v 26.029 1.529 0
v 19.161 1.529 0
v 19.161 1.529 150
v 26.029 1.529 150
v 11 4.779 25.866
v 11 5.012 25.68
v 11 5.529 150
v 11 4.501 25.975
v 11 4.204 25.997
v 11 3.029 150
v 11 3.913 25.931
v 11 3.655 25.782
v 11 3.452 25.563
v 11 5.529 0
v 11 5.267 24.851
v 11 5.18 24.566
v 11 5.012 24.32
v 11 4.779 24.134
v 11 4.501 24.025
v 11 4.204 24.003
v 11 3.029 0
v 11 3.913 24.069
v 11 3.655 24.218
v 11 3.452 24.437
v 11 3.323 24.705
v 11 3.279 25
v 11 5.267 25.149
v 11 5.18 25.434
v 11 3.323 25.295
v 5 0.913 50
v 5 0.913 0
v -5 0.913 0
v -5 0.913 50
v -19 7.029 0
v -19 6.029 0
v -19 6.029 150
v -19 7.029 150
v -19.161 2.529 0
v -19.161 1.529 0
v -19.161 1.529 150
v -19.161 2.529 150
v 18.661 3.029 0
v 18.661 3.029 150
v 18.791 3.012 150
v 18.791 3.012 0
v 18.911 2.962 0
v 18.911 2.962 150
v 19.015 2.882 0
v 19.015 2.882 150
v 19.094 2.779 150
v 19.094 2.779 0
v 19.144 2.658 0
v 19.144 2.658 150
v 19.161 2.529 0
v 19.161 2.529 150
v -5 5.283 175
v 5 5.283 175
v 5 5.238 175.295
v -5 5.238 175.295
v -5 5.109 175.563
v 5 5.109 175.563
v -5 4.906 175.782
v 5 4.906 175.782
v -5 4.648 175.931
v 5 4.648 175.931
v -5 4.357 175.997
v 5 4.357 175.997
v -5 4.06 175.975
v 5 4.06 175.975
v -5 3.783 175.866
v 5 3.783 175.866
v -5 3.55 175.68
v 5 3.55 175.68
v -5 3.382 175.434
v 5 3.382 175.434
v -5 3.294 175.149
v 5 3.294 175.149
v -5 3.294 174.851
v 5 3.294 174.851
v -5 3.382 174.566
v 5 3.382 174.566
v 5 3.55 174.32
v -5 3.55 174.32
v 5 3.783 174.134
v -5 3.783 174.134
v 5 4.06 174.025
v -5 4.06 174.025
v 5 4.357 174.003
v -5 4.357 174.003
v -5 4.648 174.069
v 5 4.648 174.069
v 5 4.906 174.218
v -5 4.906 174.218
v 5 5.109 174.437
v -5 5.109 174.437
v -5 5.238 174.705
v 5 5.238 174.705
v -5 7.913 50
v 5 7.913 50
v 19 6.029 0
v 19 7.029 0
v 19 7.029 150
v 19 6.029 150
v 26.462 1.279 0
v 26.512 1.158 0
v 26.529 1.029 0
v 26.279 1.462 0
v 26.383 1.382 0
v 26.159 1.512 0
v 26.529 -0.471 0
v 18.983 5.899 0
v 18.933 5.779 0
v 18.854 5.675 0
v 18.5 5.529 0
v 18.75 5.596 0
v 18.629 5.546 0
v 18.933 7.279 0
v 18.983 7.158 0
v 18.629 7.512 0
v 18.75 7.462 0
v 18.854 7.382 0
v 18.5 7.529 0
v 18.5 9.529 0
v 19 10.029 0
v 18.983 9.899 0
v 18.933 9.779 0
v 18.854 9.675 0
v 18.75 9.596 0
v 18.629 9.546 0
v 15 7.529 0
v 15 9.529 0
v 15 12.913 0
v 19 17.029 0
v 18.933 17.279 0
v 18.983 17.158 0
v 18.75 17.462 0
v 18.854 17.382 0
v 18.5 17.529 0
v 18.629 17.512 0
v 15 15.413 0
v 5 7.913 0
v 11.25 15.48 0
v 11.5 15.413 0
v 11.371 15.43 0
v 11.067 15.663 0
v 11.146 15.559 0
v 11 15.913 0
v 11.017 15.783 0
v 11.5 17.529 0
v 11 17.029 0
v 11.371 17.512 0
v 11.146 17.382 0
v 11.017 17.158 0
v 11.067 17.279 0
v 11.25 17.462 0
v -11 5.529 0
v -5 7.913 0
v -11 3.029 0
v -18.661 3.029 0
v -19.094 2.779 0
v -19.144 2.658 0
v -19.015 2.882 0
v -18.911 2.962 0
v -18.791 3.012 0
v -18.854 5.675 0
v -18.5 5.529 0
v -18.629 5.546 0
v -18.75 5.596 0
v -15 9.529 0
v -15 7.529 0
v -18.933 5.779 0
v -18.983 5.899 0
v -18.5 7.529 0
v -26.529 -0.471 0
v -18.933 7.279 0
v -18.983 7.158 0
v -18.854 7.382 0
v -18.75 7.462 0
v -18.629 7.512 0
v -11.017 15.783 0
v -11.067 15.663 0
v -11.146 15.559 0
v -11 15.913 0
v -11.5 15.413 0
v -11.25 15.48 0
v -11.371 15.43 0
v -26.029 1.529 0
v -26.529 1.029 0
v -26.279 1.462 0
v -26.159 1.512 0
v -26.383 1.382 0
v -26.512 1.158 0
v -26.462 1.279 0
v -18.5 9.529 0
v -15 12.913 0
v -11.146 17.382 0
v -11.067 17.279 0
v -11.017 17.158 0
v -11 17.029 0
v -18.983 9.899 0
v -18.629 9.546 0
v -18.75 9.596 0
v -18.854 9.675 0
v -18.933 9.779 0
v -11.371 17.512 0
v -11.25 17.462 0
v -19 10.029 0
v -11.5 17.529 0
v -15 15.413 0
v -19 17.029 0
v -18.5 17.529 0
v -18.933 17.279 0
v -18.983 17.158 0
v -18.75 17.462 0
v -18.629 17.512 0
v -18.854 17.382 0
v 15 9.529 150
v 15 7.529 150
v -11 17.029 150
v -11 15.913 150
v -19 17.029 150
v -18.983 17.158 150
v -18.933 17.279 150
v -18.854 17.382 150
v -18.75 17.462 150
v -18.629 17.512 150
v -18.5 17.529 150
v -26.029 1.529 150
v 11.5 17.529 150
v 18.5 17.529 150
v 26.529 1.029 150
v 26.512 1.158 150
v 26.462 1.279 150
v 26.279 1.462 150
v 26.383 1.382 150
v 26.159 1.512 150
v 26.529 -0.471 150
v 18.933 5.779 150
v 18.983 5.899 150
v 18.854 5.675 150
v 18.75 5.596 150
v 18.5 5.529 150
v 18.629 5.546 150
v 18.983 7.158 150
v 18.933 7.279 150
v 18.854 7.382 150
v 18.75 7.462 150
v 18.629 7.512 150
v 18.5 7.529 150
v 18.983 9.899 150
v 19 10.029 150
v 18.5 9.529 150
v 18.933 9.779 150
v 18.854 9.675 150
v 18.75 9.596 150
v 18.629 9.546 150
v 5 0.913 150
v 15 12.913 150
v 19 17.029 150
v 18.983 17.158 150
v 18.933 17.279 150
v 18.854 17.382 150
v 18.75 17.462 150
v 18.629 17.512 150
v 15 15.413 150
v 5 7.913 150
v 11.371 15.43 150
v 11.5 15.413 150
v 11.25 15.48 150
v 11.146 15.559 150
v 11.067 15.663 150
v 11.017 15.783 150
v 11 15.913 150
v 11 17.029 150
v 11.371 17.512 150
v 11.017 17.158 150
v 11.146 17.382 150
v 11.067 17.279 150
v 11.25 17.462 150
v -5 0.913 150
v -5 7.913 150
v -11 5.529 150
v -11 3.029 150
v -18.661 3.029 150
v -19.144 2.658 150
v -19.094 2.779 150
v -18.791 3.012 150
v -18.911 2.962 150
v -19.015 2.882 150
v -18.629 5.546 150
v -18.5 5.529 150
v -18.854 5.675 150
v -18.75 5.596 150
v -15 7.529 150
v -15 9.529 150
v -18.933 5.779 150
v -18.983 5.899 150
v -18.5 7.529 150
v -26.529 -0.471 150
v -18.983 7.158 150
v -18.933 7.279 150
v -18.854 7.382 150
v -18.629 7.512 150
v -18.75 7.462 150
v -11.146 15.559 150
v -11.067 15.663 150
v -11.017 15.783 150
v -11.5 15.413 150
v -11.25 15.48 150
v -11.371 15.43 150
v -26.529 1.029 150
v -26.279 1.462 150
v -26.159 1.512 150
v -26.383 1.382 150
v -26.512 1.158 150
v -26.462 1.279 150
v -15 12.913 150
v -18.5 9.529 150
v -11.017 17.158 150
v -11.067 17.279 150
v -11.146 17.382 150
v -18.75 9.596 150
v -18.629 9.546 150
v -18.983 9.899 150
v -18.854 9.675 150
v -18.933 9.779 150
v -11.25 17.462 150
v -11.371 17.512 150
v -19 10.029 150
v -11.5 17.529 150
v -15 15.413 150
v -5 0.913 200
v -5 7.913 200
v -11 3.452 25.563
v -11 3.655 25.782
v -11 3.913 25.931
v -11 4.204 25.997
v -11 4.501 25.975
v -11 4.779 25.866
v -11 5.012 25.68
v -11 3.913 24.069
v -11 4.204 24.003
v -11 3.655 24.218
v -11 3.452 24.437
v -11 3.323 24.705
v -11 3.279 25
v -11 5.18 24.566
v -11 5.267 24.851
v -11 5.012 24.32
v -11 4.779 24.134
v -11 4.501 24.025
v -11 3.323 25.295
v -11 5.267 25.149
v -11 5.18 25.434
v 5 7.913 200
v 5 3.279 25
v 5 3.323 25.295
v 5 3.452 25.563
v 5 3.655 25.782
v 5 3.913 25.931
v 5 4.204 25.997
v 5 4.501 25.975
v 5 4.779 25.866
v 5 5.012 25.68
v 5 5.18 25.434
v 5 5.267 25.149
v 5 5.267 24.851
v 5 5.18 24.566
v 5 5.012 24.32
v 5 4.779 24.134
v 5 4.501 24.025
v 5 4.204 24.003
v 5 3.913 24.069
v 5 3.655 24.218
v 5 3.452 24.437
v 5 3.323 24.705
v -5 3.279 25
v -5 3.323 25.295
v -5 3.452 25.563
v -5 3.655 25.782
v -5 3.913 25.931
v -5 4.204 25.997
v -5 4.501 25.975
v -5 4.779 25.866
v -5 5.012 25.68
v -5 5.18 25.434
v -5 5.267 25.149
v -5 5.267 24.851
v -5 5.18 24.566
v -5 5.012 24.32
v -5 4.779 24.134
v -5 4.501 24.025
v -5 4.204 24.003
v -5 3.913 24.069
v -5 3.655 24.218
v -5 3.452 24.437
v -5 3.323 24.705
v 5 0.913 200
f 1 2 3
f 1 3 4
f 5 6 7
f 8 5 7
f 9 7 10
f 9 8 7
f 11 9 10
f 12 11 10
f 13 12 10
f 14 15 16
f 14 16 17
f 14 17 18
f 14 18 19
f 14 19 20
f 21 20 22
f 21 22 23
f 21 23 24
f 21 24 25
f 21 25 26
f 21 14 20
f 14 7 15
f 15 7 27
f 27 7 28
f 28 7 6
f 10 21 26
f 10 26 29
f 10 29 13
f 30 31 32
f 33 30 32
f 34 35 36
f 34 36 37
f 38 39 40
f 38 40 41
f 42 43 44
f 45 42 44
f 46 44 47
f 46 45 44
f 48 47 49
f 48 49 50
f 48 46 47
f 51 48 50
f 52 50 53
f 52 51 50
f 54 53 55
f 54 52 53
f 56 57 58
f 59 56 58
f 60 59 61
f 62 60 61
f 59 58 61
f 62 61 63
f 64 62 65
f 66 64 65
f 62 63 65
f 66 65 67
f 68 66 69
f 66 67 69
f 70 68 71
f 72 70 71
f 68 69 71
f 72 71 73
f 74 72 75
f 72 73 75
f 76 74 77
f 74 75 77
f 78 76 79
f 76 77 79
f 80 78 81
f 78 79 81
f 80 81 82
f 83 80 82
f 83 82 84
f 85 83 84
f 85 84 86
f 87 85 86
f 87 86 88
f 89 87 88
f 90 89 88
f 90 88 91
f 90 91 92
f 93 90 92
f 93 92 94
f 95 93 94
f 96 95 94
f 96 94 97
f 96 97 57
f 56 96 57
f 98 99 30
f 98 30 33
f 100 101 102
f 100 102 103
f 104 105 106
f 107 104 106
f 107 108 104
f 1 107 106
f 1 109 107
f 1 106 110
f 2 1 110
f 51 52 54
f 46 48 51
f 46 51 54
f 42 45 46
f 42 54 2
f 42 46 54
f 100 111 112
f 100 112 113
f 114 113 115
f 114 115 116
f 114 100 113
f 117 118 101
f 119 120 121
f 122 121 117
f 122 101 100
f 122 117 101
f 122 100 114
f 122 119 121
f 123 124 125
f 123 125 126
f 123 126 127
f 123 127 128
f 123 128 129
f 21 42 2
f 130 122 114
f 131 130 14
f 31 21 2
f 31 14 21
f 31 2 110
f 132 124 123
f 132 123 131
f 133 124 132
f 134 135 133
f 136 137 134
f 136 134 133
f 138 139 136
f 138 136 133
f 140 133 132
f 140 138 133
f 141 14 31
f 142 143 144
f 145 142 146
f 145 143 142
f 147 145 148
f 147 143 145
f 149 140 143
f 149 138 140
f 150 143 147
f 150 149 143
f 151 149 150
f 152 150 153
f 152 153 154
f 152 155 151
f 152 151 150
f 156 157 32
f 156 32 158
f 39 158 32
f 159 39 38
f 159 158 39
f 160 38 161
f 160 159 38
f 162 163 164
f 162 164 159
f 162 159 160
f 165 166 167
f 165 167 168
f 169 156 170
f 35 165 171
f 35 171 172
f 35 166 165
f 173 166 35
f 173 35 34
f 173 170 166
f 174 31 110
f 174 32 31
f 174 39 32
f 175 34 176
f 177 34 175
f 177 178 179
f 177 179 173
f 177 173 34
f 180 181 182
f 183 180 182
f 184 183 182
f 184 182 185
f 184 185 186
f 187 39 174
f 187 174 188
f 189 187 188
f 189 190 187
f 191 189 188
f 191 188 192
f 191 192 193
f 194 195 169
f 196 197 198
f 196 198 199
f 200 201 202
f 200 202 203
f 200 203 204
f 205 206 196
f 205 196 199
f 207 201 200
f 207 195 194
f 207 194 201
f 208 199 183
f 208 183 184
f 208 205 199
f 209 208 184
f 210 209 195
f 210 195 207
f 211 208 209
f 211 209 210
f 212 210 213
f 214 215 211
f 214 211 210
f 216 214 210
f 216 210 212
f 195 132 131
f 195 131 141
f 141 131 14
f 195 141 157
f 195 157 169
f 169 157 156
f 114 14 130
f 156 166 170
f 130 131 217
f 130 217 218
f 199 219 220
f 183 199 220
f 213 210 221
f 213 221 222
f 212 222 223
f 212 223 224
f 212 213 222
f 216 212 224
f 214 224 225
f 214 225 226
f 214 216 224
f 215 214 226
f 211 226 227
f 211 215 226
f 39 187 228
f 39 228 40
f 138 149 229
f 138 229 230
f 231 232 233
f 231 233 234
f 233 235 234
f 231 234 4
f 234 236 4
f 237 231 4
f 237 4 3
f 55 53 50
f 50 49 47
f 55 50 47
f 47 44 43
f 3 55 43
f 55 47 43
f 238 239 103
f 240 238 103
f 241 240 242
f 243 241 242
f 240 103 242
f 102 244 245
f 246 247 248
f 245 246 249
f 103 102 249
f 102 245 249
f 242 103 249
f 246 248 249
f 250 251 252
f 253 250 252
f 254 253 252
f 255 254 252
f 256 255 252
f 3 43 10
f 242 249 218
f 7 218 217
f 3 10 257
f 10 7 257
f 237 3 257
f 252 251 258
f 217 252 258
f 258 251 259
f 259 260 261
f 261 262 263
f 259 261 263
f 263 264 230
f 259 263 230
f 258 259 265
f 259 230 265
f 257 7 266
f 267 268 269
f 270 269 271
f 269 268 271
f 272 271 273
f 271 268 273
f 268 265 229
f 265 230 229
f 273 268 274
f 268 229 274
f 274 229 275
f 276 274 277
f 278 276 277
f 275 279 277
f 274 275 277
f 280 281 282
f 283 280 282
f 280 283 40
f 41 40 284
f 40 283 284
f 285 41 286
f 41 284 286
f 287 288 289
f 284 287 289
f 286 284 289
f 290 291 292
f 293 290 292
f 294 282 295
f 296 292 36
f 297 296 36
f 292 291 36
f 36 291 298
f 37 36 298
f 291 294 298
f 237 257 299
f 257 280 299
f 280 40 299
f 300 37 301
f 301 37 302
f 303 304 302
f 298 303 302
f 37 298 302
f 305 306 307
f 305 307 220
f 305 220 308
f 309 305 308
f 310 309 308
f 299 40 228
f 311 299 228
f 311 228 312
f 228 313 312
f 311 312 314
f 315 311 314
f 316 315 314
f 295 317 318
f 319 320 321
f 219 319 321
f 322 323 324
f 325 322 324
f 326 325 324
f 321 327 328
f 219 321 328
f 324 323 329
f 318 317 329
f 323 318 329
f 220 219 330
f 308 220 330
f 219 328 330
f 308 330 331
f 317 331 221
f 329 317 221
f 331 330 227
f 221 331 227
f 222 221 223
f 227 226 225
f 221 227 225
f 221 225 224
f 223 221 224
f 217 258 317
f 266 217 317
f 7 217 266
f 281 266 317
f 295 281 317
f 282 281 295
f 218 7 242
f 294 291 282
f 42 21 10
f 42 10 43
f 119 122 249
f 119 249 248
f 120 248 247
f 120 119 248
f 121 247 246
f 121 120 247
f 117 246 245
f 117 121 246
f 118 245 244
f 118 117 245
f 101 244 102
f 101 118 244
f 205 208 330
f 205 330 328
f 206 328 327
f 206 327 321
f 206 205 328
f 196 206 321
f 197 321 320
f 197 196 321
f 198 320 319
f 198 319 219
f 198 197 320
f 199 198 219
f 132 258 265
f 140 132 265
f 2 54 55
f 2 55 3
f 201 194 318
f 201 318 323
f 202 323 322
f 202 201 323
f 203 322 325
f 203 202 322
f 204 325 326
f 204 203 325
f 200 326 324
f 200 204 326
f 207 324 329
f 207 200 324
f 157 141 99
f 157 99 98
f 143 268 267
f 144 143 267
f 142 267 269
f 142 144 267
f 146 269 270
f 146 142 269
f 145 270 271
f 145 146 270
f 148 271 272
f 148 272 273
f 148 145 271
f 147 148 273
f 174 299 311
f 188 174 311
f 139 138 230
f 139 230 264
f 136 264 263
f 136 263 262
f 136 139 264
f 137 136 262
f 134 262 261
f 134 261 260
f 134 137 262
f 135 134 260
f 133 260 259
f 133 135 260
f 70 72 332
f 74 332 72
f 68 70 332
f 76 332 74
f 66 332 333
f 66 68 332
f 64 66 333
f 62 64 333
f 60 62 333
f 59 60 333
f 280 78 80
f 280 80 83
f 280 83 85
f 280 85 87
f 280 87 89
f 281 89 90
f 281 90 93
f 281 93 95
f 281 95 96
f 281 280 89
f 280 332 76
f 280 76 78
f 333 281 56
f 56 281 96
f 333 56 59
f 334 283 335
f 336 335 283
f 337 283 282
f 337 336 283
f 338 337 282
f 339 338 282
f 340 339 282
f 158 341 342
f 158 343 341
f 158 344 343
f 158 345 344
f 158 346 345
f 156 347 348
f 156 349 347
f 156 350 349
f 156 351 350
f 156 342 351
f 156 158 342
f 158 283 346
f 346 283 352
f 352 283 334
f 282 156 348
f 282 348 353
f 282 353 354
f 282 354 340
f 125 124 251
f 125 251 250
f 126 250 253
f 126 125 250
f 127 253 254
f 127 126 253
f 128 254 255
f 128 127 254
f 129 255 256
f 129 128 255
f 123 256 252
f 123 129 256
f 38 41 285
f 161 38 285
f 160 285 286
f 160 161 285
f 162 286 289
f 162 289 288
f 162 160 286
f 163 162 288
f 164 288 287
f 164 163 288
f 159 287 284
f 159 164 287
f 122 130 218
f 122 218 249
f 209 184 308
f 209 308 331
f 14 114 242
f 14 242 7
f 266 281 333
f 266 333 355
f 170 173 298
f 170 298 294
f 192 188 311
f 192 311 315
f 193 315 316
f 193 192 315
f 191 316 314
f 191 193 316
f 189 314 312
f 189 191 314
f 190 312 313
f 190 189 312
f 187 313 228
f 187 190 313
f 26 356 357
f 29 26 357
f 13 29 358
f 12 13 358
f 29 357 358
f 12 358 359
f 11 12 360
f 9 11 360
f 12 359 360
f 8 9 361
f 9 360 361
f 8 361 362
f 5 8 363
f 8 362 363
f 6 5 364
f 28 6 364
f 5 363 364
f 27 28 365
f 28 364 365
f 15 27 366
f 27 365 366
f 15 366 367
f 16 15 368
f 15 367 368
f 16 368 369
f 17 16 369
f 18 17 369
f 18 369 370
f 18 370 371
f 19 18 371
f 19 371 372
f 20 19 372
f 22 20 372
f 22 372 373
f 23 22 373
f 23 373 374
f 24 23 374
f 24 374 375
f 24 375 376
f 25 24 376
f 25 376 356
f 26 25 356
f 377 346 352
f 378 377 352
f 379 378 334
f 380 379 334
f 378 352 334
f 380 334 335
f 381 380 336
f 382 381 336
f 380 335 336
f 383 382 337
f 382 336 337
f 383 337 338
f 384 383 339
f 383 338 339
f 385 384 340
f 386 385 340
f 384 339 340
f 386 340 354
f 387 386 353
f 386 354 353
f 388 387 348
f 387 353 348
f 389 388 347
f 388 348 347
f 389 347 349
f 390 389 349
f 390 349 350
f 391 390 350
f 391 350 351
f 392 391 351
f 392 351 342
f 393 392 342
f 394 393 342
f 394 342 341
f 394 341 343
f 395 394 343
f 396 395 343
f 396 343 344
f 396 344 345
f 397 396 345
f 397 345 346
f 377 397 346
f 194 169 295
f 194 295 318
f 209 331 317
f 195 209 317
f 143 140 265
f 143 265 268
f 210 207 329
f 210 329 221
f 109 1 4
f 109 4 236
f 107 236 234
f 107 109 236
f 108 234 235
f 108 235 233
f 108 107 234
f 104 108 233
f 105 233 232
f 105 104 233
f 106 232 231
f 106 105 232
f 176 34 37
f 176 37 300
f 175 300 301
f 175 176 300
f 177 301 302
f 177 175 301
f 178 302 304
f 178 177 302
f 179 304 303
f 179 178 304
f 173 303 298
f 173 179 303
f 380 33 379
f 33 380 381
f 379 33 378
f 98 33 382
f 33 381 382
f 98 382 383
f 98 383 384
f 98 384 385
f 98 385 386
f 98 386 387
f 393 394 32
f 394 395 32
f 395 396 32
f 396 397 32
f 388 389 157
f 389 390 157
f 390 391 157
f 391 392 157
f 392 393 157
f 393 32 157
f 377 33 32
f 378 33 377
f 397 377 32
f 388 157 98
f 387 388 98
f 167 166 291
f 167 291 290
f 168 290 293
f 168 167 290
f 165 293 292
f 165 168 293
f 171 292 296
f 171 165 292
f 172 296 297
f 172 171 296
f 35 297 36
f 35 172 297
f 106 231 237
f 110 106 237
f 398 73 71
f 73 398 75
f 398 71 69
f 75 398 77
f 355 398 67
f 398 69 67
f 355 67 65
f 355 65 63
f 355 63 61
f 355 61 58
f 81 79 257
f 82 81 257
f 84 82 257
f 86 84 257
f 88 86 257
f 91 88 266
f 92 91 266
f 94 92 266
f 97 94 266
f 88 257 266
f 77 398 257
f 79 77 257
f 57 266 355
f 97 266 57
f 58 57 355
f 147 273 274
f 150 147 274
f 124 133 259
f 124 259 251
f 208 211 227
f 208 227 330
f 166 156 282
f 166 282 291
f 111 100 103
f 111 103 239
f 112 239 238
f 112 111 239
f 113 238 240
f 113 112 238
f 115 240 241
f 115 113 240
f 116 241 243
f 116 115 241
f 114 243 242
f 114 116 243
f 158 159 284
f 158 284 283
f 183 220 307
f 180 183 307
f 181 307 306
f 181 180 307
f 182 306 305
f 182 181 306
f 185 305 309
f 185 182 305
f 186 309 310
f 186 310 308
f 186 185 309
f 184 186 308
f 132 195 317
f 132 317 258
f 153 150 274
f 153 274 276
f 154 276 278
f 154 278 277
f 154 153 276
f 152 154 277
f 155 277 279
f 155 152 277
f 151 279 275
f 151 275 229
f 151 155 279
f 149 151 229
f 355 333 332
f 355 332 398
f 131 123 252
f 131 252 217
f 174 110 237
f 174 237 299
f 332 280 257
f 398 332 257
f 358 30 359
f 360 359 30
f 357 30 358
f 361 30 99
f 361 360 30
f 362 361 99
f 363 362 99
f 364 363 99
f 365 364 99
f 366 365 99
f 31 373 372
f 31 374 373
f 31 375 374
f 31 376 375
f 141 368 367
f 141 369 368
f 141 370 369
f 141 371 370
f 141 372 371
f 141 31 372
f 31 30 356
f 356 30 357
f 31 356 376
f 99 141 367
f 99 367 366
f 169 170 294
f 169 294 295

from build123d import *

# Parameters (mm, degrees)
BOSS_EXTRUDE1_DEPTH = 150
SKETCH2_W           = 10
SKETCH2_H           = 7
BOSS_EXTRUDE4_DEPTH = 50
SKETCH4_R           = 1
CUT_EXTRUDE2_DEPTH  = 50
SKETCH5_W           = 10
SKETCH5_H           = 7
CUT_EXTRUDE3_DEPTH  = 50
SKETCH6_R           = 1
CUT_EXTRUDE4_DEPTH  = 100


with BuildPart() as part:
    # Sketch1 → Boss-Extrude1 (new body)
    with BuildSketch(Plane.XY):
        with BuildLine():
            Line((-15, 12.912739296), (15, 12.912739296))
            Line((15, 12.912739296), (15, 15.412739296))
            Line((15, 15.412739296), (11.5, 15.412739296))
            ThreePointArc((11.5, 15.412739296), (11.146446609, 15.559185905), (11, 15.912739296))
            Line((11, 15.912739296), (11, 17.028604707))
            ThreePointArc((11, 17.028604707), (11.146446609, 17.382158098), (11.5, 17.528604707))
            Line((11.5, 17.528604707), (18.5, 17.528604707))
            ThreePointArc((18.5, 17.528604707), (18.853553391, 17.382158098), (19, 17.028604707))
            Line((19, 17.028604707), (19, 10.028604707))
            ThreePointArc((19, 10.028604707), (18.853553391, 9.675051316), (18.5, 9.528604707))
            Line((18.5, 9.528604707), (15, 9.528604707))
            Line((15, 9.528604707), (15, 7.528604707))
            Line((15, 7.528604707), (18.5, 7.528604707))
            ThreePointArc((18.5, 7.528604707), (18.853553391, 7.382158098), (19, 7.028604707))
            Line((19, 7.028604707), (19, 6.028604707))
            ThreePointArc((19, 6.028604707), (18.853553391, 5.675051316), (18.5, 5.528604707))
            Line((18.5, 5.528604707), (11, 5.528604707))
            Line((11, 5.528604707), (11, 3.028604707))
            Line((11, 3.028604707), (18.661195157, 3.028604707))
            ThreePointArc((18.661195157, 3.028604707), (19.014748547, 2.882158098), (19.161195157, 2.528604707))
            Line((19.161195157, 2.528604707), (19.161195157, 1.528604707))
            Line((19.161195157, 1.528604707), (26.029307443, 1.528604707))
            ThreePointArc((26.029307443, 1.528604707), (26.382860834, 1.382158098), (26.529307443, 1.028604707))
            Line((26.529307443, 1.028604707), (26.529307443, -0.471395293))
            Line((26.529307443, -0.471395293), (11.070535665, -0.471395293))
            Line((11.070535665, -0.471395293), (-11.070535665, -0.471395293))
            Line((-11.070535665, -0.471395293), (-26.529307443, -0.471395293))
            Line((-26.529307443, -0.471395293), (-26.529307443, 1.028604707))
            ThreePointArc((-26.529307443, 1.028604707), (-26.382860834, 1.382158098), (-26.029307443, 1.528604707))
            Line((-26.029307443, 1.528604707), (-19.161195157, 1.528604707))
            Line((-19.161195157, 1.528604707), (-19.161195157, 2.528604707))
            ThreePointArc((-19.161195157, 2.528604707), (-19.014748547, 2.882158098), (-18.661195157, 3.028604707))
            Line((-18.661195157, 3.028604707), (-11, 3.028604707))
            Line((-11, 3.028604707), (-11, 5.528604707))
            Line((-11, 5.528604707), (-18.5, 5.528604707))
            ThreePointArc((-18.5, 5.528604707), (-18.853553391, 5.675051316), (-19, 6.028604707))
            Line((-19, 6.028604707), (-19, 7.028604707))
            ThreePointArc((-19, 7.028604707), (-18.853553391, 7.382158098), (-18.5, 7.528604707))
            Line((-18.5, 7.528604707), (-15, 7.528604707))
            Line((-15, 7.528604707), (-15, 9.528604707))
            Line((-15, 9.528604707), (-18.5, 9.528604707))
            ThreePointArc((-18.5, 9.528604707), (-18.853553391, 9.675051316), (-19, 10.028604707))
            Line((-19, 10.028604707), (-19, 17.028604707))
            ThreePointArc((-19, 17.028604707), (-18.853553391, 17.382158098), (-18.5, 17.528604707))
            Line((-18.5, 17.528604707), (-11.5, 17.528604707))
            ThreePointArc((-11.5, 17.528604707), (-11.146446609, 17.382158098), (-11, 17.028604707))
            Line((-11, 17.028604707), (-11, 15.912739296))
            ThreePointArc((-11, 15.912739296), (-11.146446609, 15.559185905), (-11.5, 15.412739296))
            Line((-11.5, 15.412739296), (-15, 15.412739296))
            Line((-15, 15.412739296), (-15, 12.912739296))
        make_face()
    extrude(amount=BOSS_EXTRUDE1_DEPTH)

    # Sketch2 → Boss-Extrude4 (add)
    with BuildSketch(Plane.XY.offset(150)):
        with Locations((0, 4.412739296)):
            Rectangle(SKETCH2_W, SKETCH2_H)
    extrude(amount=BOSS_EXTRUDE4_DEPTH)

    # Sketch4 → Cut-Extrude2 (cut)
    with BuildSketch(Plane(origin=(5, 0, 0), x_dir=(0, 0, -1), z_dir=(1, 0, 0))):
        with Locations(Location((-175, 4.282739296, 0), (0, 0, 90))):
            Circle(SKETCH4_R)
    extrude(amount=-CUT_EXTRUDE2_DEPTH, mode=Mode.SUBTRACT)

    # Sketch5 → Cut-Extrude3 (cut)
    with BuildSketch(Plane(origin=(0, 0, 0), x_dir=(-1, 0, 0), z_dir=(0, 0, -1))):
        with Locations((0, 4.412739296)):
            Rectangle(SKETCH5_W, SKETCH5_H)
    extrude(amount=-CUT_EXTRUDE3_DEPTH, mode=Mode.SUBTRACT)

    # Sketch6 → Cut-Extrude4 (cut)
    with BuildSketch(Plane.ZY.offset(11)):
        with Locations(Location((25, 4.278604707, 0), (0, 0, 270))):
            Circle(SKETCH6_R)
    extrude(amount=-CUT_EXTRUDE4_DEPTH, mode=Mode.SUBTRACT)


solid = part.part
